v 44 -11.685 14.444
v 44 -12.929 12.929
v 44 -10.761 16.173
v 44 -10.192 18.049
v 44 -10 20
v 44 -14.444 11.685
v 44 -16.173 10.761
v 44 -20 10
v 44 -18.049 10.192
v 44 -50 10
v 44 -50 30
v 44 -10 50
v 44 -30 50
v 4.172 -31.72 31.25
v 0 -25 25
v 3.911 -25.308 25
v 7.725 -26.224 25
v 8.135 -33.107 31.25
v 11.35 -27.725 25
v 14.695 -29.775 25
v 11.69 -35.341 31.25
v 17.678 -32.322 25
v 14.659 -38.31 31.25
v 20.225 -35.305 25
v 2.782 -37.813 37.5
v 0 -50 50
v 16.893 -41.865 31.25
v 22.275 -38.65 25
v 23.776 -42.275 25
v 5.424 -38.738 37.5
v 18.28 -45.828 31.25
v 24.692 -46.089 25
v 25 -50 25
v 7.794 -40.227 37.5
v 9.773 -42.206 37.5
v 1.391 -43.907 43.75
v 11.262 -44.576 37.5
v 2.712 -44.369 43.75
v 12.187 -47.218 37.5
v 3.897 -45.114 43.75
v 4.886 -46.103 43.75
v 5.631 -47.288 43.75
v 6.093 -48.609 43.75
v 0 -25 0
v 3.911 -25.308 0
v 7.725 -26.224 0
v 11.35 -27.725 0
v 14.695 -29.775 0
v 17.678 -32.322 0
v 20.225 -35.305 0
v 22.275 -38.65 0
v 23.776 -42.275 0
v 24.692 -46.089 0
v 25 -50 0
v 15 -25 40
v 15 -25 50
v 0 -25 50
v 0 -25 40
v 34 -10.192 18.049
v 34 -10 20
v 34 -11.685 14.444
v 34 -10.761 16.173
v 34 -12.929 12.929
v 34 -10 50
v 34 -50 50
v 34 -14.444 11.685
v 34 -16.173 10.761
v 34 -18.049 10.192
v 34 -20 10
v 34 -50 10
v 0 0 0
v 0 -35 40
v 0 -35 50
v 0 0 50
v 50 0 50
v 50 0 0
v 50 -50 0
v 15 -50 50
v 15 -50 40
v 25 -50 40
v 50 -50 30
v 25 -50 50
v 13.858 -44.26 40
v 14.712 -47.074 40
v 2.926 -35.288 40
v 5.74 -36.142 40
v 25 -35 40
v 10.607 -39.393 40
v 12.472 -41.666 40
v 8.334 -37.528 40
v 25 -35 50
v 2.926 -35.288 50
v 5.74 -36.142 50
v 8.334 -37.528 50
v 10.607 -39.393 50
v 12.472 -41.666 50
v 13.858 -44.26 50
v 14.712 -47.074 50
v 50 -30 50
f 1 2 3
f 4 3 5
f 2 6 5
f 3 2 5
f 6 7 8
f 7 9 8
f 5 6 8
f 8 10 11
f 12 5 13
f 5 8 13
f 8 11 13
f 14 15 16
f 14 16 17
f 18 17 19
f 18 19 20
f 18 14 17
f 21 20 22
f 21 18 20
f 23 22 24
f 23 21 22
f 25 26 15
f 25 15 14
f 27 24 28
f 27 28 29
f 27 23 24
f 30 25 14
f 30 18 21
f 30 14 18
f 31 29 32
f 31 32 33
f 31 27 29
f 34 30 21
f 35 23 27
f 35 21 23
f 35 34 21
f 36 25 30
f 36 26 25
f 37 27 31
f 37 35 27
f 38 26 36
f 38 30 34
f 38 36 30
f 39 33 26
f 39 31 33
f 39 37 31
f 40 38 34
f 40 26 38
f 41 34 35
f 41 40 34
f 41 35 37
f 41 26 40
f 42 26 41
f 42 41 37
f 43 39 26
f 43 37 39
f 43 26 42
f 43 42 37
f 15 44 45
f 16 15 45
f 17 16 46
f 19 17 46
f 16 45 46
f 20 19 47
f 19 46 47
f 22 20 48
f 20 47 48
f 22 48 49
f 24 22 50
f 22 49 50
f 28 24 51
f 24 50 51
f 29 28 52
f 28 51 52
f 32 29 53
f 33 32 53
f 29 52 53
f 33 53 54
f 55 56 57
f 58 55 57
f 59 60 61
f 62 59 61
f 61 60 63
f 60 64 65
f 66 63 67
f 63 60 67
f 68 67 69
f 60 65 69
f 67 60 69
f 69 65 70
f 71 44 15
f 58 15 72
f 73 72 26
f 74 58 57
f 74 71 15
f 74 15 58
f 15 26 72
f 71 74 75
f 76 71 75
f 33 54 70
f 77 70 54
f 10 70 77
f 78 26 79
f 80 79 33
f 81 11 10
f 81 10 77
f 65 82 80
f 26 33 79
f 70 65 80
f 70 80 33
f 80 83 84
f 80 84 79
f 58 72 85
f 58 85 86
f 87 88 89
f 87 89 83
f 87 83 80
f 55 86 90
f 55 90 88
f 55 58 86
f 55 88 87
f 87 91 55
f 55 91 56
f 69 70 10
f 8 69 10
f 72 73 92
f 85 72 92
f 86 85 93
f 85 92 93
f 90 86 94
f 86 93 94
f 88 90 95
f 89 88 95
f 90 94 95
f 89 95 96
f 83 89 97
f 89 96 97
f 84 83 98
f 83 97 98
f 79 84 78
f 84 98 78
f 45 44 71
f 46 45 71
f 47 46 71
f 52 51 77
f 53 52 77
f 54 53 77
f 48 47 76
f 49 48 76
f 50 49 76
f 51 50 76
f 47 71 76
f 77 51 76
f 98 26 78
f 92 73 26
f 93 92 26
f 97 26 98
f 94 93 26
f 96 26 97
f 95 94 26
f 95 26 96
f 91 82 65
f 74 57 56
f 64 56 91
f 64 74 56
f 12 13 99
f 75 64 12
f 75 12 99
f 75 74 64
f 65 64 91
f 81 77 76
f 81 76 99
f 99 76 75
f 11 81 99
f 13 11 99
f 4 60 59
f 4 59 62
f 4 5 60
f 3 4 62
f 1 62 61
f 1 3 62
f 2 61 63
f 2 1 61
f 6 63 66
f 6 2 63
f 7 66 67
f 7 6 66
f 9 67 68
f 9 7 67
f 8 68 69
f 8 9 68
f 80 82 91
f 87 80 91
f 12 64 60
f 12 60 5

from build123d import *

# Parameters (mm, degrees)
F0_W      = 50
F0_H      = 50
F1_DEPTH  = 50
F3_DEPTH  = 6
F5_DEPTH  = 40
F6_R      = 10
F8_DEPTH  = 10
F10_DEPTH = 25


with BuildPart() as f1:
    # F0 (on Front) → F1 (new body)
    with BuildSketch(Plane.XZ):
        with Locations((25, 25)):
            Rectangle(F0_W, F0_H)
    extrude(amount=F1_DEPTH)

    # F2 (on face) → F3 (cut)
    with BuildSketch(Plane.YZ.offset(50)):
        Polygon((-30, 50), (-50, 50), (-50, 30), align=None)
    extrude(amount=-F3_DEPTH, mode=Mode.SUBTRACT)

    # F4 (on face) → F5 (cut)
    with BuildSketch(Plane.XZ.offset(50)):
        Polygon((44, 30), (44, 50), (34, 50), (34, 10), (44, 10), align=None)
    extrude(amount=-F5_DEPTH, mode=Mode.SUBTRACT)

    # F6
    f6_edges = [f1.edges().sort_by_distance(p)[0] for p in [
        (39, -10, 10),
    ]]
    fillet(f6_edges, radius=F6_R)

    # F7 (on face) → F8 (cut)
    with BuildSketch(Plane.XY.offset(50)):
        with BuildLine():
            ThreePointArc((0, -35), (10.6066017178, -39.3933982822), (15, -50))
            Line((15, -50), (25, -50))
            Line((25, -50), (25, -35))
            Line((25, -35), (15, -25))
            Line((15, -25), (0, -25))
            Line((0, -25), (0, -35))
        make_face()
    extrude(amount=-F8_DEPTH, mode=Mode.SUBTRACT)

    # F9 (on face) → F10 (cut)
    with BuildSketch(Plane(origin=(0, 0, 0), x_dir=(1, 0, 0), z_dir=(0, 0, -1))):
        with BuildLine():
            ThreePointArc((0, 25), (17.6776695297, 32.3223304703), (25, 50))
            Line((25, 50), (0, 50))
            Line((0, 50), (0, 25))
        make_face()
    extrude(amount=-F10_DEPTH, mode=Mode.SUBTRACT)

    # F12 (on face) + F13 (on face) → F14 (revolve, cut)
    with BuildSketch(Plane.XZ.offset(50)):
        Polygon((25, 25), (0, 50), (0, 25), align=None)
    with BuildSketch(Plane(origin=(0, 0, 0), x_dir=(0, -1, 0), z_dir=(-1, 0, 0))):
        Polygon((50, 25), (50, 50), (25, 25), align=None)
    revolve(axis=Axis((0, -50, 25), (0, 0, -1)), mode=Mode.SUBTRACT)


solid = f1.part
